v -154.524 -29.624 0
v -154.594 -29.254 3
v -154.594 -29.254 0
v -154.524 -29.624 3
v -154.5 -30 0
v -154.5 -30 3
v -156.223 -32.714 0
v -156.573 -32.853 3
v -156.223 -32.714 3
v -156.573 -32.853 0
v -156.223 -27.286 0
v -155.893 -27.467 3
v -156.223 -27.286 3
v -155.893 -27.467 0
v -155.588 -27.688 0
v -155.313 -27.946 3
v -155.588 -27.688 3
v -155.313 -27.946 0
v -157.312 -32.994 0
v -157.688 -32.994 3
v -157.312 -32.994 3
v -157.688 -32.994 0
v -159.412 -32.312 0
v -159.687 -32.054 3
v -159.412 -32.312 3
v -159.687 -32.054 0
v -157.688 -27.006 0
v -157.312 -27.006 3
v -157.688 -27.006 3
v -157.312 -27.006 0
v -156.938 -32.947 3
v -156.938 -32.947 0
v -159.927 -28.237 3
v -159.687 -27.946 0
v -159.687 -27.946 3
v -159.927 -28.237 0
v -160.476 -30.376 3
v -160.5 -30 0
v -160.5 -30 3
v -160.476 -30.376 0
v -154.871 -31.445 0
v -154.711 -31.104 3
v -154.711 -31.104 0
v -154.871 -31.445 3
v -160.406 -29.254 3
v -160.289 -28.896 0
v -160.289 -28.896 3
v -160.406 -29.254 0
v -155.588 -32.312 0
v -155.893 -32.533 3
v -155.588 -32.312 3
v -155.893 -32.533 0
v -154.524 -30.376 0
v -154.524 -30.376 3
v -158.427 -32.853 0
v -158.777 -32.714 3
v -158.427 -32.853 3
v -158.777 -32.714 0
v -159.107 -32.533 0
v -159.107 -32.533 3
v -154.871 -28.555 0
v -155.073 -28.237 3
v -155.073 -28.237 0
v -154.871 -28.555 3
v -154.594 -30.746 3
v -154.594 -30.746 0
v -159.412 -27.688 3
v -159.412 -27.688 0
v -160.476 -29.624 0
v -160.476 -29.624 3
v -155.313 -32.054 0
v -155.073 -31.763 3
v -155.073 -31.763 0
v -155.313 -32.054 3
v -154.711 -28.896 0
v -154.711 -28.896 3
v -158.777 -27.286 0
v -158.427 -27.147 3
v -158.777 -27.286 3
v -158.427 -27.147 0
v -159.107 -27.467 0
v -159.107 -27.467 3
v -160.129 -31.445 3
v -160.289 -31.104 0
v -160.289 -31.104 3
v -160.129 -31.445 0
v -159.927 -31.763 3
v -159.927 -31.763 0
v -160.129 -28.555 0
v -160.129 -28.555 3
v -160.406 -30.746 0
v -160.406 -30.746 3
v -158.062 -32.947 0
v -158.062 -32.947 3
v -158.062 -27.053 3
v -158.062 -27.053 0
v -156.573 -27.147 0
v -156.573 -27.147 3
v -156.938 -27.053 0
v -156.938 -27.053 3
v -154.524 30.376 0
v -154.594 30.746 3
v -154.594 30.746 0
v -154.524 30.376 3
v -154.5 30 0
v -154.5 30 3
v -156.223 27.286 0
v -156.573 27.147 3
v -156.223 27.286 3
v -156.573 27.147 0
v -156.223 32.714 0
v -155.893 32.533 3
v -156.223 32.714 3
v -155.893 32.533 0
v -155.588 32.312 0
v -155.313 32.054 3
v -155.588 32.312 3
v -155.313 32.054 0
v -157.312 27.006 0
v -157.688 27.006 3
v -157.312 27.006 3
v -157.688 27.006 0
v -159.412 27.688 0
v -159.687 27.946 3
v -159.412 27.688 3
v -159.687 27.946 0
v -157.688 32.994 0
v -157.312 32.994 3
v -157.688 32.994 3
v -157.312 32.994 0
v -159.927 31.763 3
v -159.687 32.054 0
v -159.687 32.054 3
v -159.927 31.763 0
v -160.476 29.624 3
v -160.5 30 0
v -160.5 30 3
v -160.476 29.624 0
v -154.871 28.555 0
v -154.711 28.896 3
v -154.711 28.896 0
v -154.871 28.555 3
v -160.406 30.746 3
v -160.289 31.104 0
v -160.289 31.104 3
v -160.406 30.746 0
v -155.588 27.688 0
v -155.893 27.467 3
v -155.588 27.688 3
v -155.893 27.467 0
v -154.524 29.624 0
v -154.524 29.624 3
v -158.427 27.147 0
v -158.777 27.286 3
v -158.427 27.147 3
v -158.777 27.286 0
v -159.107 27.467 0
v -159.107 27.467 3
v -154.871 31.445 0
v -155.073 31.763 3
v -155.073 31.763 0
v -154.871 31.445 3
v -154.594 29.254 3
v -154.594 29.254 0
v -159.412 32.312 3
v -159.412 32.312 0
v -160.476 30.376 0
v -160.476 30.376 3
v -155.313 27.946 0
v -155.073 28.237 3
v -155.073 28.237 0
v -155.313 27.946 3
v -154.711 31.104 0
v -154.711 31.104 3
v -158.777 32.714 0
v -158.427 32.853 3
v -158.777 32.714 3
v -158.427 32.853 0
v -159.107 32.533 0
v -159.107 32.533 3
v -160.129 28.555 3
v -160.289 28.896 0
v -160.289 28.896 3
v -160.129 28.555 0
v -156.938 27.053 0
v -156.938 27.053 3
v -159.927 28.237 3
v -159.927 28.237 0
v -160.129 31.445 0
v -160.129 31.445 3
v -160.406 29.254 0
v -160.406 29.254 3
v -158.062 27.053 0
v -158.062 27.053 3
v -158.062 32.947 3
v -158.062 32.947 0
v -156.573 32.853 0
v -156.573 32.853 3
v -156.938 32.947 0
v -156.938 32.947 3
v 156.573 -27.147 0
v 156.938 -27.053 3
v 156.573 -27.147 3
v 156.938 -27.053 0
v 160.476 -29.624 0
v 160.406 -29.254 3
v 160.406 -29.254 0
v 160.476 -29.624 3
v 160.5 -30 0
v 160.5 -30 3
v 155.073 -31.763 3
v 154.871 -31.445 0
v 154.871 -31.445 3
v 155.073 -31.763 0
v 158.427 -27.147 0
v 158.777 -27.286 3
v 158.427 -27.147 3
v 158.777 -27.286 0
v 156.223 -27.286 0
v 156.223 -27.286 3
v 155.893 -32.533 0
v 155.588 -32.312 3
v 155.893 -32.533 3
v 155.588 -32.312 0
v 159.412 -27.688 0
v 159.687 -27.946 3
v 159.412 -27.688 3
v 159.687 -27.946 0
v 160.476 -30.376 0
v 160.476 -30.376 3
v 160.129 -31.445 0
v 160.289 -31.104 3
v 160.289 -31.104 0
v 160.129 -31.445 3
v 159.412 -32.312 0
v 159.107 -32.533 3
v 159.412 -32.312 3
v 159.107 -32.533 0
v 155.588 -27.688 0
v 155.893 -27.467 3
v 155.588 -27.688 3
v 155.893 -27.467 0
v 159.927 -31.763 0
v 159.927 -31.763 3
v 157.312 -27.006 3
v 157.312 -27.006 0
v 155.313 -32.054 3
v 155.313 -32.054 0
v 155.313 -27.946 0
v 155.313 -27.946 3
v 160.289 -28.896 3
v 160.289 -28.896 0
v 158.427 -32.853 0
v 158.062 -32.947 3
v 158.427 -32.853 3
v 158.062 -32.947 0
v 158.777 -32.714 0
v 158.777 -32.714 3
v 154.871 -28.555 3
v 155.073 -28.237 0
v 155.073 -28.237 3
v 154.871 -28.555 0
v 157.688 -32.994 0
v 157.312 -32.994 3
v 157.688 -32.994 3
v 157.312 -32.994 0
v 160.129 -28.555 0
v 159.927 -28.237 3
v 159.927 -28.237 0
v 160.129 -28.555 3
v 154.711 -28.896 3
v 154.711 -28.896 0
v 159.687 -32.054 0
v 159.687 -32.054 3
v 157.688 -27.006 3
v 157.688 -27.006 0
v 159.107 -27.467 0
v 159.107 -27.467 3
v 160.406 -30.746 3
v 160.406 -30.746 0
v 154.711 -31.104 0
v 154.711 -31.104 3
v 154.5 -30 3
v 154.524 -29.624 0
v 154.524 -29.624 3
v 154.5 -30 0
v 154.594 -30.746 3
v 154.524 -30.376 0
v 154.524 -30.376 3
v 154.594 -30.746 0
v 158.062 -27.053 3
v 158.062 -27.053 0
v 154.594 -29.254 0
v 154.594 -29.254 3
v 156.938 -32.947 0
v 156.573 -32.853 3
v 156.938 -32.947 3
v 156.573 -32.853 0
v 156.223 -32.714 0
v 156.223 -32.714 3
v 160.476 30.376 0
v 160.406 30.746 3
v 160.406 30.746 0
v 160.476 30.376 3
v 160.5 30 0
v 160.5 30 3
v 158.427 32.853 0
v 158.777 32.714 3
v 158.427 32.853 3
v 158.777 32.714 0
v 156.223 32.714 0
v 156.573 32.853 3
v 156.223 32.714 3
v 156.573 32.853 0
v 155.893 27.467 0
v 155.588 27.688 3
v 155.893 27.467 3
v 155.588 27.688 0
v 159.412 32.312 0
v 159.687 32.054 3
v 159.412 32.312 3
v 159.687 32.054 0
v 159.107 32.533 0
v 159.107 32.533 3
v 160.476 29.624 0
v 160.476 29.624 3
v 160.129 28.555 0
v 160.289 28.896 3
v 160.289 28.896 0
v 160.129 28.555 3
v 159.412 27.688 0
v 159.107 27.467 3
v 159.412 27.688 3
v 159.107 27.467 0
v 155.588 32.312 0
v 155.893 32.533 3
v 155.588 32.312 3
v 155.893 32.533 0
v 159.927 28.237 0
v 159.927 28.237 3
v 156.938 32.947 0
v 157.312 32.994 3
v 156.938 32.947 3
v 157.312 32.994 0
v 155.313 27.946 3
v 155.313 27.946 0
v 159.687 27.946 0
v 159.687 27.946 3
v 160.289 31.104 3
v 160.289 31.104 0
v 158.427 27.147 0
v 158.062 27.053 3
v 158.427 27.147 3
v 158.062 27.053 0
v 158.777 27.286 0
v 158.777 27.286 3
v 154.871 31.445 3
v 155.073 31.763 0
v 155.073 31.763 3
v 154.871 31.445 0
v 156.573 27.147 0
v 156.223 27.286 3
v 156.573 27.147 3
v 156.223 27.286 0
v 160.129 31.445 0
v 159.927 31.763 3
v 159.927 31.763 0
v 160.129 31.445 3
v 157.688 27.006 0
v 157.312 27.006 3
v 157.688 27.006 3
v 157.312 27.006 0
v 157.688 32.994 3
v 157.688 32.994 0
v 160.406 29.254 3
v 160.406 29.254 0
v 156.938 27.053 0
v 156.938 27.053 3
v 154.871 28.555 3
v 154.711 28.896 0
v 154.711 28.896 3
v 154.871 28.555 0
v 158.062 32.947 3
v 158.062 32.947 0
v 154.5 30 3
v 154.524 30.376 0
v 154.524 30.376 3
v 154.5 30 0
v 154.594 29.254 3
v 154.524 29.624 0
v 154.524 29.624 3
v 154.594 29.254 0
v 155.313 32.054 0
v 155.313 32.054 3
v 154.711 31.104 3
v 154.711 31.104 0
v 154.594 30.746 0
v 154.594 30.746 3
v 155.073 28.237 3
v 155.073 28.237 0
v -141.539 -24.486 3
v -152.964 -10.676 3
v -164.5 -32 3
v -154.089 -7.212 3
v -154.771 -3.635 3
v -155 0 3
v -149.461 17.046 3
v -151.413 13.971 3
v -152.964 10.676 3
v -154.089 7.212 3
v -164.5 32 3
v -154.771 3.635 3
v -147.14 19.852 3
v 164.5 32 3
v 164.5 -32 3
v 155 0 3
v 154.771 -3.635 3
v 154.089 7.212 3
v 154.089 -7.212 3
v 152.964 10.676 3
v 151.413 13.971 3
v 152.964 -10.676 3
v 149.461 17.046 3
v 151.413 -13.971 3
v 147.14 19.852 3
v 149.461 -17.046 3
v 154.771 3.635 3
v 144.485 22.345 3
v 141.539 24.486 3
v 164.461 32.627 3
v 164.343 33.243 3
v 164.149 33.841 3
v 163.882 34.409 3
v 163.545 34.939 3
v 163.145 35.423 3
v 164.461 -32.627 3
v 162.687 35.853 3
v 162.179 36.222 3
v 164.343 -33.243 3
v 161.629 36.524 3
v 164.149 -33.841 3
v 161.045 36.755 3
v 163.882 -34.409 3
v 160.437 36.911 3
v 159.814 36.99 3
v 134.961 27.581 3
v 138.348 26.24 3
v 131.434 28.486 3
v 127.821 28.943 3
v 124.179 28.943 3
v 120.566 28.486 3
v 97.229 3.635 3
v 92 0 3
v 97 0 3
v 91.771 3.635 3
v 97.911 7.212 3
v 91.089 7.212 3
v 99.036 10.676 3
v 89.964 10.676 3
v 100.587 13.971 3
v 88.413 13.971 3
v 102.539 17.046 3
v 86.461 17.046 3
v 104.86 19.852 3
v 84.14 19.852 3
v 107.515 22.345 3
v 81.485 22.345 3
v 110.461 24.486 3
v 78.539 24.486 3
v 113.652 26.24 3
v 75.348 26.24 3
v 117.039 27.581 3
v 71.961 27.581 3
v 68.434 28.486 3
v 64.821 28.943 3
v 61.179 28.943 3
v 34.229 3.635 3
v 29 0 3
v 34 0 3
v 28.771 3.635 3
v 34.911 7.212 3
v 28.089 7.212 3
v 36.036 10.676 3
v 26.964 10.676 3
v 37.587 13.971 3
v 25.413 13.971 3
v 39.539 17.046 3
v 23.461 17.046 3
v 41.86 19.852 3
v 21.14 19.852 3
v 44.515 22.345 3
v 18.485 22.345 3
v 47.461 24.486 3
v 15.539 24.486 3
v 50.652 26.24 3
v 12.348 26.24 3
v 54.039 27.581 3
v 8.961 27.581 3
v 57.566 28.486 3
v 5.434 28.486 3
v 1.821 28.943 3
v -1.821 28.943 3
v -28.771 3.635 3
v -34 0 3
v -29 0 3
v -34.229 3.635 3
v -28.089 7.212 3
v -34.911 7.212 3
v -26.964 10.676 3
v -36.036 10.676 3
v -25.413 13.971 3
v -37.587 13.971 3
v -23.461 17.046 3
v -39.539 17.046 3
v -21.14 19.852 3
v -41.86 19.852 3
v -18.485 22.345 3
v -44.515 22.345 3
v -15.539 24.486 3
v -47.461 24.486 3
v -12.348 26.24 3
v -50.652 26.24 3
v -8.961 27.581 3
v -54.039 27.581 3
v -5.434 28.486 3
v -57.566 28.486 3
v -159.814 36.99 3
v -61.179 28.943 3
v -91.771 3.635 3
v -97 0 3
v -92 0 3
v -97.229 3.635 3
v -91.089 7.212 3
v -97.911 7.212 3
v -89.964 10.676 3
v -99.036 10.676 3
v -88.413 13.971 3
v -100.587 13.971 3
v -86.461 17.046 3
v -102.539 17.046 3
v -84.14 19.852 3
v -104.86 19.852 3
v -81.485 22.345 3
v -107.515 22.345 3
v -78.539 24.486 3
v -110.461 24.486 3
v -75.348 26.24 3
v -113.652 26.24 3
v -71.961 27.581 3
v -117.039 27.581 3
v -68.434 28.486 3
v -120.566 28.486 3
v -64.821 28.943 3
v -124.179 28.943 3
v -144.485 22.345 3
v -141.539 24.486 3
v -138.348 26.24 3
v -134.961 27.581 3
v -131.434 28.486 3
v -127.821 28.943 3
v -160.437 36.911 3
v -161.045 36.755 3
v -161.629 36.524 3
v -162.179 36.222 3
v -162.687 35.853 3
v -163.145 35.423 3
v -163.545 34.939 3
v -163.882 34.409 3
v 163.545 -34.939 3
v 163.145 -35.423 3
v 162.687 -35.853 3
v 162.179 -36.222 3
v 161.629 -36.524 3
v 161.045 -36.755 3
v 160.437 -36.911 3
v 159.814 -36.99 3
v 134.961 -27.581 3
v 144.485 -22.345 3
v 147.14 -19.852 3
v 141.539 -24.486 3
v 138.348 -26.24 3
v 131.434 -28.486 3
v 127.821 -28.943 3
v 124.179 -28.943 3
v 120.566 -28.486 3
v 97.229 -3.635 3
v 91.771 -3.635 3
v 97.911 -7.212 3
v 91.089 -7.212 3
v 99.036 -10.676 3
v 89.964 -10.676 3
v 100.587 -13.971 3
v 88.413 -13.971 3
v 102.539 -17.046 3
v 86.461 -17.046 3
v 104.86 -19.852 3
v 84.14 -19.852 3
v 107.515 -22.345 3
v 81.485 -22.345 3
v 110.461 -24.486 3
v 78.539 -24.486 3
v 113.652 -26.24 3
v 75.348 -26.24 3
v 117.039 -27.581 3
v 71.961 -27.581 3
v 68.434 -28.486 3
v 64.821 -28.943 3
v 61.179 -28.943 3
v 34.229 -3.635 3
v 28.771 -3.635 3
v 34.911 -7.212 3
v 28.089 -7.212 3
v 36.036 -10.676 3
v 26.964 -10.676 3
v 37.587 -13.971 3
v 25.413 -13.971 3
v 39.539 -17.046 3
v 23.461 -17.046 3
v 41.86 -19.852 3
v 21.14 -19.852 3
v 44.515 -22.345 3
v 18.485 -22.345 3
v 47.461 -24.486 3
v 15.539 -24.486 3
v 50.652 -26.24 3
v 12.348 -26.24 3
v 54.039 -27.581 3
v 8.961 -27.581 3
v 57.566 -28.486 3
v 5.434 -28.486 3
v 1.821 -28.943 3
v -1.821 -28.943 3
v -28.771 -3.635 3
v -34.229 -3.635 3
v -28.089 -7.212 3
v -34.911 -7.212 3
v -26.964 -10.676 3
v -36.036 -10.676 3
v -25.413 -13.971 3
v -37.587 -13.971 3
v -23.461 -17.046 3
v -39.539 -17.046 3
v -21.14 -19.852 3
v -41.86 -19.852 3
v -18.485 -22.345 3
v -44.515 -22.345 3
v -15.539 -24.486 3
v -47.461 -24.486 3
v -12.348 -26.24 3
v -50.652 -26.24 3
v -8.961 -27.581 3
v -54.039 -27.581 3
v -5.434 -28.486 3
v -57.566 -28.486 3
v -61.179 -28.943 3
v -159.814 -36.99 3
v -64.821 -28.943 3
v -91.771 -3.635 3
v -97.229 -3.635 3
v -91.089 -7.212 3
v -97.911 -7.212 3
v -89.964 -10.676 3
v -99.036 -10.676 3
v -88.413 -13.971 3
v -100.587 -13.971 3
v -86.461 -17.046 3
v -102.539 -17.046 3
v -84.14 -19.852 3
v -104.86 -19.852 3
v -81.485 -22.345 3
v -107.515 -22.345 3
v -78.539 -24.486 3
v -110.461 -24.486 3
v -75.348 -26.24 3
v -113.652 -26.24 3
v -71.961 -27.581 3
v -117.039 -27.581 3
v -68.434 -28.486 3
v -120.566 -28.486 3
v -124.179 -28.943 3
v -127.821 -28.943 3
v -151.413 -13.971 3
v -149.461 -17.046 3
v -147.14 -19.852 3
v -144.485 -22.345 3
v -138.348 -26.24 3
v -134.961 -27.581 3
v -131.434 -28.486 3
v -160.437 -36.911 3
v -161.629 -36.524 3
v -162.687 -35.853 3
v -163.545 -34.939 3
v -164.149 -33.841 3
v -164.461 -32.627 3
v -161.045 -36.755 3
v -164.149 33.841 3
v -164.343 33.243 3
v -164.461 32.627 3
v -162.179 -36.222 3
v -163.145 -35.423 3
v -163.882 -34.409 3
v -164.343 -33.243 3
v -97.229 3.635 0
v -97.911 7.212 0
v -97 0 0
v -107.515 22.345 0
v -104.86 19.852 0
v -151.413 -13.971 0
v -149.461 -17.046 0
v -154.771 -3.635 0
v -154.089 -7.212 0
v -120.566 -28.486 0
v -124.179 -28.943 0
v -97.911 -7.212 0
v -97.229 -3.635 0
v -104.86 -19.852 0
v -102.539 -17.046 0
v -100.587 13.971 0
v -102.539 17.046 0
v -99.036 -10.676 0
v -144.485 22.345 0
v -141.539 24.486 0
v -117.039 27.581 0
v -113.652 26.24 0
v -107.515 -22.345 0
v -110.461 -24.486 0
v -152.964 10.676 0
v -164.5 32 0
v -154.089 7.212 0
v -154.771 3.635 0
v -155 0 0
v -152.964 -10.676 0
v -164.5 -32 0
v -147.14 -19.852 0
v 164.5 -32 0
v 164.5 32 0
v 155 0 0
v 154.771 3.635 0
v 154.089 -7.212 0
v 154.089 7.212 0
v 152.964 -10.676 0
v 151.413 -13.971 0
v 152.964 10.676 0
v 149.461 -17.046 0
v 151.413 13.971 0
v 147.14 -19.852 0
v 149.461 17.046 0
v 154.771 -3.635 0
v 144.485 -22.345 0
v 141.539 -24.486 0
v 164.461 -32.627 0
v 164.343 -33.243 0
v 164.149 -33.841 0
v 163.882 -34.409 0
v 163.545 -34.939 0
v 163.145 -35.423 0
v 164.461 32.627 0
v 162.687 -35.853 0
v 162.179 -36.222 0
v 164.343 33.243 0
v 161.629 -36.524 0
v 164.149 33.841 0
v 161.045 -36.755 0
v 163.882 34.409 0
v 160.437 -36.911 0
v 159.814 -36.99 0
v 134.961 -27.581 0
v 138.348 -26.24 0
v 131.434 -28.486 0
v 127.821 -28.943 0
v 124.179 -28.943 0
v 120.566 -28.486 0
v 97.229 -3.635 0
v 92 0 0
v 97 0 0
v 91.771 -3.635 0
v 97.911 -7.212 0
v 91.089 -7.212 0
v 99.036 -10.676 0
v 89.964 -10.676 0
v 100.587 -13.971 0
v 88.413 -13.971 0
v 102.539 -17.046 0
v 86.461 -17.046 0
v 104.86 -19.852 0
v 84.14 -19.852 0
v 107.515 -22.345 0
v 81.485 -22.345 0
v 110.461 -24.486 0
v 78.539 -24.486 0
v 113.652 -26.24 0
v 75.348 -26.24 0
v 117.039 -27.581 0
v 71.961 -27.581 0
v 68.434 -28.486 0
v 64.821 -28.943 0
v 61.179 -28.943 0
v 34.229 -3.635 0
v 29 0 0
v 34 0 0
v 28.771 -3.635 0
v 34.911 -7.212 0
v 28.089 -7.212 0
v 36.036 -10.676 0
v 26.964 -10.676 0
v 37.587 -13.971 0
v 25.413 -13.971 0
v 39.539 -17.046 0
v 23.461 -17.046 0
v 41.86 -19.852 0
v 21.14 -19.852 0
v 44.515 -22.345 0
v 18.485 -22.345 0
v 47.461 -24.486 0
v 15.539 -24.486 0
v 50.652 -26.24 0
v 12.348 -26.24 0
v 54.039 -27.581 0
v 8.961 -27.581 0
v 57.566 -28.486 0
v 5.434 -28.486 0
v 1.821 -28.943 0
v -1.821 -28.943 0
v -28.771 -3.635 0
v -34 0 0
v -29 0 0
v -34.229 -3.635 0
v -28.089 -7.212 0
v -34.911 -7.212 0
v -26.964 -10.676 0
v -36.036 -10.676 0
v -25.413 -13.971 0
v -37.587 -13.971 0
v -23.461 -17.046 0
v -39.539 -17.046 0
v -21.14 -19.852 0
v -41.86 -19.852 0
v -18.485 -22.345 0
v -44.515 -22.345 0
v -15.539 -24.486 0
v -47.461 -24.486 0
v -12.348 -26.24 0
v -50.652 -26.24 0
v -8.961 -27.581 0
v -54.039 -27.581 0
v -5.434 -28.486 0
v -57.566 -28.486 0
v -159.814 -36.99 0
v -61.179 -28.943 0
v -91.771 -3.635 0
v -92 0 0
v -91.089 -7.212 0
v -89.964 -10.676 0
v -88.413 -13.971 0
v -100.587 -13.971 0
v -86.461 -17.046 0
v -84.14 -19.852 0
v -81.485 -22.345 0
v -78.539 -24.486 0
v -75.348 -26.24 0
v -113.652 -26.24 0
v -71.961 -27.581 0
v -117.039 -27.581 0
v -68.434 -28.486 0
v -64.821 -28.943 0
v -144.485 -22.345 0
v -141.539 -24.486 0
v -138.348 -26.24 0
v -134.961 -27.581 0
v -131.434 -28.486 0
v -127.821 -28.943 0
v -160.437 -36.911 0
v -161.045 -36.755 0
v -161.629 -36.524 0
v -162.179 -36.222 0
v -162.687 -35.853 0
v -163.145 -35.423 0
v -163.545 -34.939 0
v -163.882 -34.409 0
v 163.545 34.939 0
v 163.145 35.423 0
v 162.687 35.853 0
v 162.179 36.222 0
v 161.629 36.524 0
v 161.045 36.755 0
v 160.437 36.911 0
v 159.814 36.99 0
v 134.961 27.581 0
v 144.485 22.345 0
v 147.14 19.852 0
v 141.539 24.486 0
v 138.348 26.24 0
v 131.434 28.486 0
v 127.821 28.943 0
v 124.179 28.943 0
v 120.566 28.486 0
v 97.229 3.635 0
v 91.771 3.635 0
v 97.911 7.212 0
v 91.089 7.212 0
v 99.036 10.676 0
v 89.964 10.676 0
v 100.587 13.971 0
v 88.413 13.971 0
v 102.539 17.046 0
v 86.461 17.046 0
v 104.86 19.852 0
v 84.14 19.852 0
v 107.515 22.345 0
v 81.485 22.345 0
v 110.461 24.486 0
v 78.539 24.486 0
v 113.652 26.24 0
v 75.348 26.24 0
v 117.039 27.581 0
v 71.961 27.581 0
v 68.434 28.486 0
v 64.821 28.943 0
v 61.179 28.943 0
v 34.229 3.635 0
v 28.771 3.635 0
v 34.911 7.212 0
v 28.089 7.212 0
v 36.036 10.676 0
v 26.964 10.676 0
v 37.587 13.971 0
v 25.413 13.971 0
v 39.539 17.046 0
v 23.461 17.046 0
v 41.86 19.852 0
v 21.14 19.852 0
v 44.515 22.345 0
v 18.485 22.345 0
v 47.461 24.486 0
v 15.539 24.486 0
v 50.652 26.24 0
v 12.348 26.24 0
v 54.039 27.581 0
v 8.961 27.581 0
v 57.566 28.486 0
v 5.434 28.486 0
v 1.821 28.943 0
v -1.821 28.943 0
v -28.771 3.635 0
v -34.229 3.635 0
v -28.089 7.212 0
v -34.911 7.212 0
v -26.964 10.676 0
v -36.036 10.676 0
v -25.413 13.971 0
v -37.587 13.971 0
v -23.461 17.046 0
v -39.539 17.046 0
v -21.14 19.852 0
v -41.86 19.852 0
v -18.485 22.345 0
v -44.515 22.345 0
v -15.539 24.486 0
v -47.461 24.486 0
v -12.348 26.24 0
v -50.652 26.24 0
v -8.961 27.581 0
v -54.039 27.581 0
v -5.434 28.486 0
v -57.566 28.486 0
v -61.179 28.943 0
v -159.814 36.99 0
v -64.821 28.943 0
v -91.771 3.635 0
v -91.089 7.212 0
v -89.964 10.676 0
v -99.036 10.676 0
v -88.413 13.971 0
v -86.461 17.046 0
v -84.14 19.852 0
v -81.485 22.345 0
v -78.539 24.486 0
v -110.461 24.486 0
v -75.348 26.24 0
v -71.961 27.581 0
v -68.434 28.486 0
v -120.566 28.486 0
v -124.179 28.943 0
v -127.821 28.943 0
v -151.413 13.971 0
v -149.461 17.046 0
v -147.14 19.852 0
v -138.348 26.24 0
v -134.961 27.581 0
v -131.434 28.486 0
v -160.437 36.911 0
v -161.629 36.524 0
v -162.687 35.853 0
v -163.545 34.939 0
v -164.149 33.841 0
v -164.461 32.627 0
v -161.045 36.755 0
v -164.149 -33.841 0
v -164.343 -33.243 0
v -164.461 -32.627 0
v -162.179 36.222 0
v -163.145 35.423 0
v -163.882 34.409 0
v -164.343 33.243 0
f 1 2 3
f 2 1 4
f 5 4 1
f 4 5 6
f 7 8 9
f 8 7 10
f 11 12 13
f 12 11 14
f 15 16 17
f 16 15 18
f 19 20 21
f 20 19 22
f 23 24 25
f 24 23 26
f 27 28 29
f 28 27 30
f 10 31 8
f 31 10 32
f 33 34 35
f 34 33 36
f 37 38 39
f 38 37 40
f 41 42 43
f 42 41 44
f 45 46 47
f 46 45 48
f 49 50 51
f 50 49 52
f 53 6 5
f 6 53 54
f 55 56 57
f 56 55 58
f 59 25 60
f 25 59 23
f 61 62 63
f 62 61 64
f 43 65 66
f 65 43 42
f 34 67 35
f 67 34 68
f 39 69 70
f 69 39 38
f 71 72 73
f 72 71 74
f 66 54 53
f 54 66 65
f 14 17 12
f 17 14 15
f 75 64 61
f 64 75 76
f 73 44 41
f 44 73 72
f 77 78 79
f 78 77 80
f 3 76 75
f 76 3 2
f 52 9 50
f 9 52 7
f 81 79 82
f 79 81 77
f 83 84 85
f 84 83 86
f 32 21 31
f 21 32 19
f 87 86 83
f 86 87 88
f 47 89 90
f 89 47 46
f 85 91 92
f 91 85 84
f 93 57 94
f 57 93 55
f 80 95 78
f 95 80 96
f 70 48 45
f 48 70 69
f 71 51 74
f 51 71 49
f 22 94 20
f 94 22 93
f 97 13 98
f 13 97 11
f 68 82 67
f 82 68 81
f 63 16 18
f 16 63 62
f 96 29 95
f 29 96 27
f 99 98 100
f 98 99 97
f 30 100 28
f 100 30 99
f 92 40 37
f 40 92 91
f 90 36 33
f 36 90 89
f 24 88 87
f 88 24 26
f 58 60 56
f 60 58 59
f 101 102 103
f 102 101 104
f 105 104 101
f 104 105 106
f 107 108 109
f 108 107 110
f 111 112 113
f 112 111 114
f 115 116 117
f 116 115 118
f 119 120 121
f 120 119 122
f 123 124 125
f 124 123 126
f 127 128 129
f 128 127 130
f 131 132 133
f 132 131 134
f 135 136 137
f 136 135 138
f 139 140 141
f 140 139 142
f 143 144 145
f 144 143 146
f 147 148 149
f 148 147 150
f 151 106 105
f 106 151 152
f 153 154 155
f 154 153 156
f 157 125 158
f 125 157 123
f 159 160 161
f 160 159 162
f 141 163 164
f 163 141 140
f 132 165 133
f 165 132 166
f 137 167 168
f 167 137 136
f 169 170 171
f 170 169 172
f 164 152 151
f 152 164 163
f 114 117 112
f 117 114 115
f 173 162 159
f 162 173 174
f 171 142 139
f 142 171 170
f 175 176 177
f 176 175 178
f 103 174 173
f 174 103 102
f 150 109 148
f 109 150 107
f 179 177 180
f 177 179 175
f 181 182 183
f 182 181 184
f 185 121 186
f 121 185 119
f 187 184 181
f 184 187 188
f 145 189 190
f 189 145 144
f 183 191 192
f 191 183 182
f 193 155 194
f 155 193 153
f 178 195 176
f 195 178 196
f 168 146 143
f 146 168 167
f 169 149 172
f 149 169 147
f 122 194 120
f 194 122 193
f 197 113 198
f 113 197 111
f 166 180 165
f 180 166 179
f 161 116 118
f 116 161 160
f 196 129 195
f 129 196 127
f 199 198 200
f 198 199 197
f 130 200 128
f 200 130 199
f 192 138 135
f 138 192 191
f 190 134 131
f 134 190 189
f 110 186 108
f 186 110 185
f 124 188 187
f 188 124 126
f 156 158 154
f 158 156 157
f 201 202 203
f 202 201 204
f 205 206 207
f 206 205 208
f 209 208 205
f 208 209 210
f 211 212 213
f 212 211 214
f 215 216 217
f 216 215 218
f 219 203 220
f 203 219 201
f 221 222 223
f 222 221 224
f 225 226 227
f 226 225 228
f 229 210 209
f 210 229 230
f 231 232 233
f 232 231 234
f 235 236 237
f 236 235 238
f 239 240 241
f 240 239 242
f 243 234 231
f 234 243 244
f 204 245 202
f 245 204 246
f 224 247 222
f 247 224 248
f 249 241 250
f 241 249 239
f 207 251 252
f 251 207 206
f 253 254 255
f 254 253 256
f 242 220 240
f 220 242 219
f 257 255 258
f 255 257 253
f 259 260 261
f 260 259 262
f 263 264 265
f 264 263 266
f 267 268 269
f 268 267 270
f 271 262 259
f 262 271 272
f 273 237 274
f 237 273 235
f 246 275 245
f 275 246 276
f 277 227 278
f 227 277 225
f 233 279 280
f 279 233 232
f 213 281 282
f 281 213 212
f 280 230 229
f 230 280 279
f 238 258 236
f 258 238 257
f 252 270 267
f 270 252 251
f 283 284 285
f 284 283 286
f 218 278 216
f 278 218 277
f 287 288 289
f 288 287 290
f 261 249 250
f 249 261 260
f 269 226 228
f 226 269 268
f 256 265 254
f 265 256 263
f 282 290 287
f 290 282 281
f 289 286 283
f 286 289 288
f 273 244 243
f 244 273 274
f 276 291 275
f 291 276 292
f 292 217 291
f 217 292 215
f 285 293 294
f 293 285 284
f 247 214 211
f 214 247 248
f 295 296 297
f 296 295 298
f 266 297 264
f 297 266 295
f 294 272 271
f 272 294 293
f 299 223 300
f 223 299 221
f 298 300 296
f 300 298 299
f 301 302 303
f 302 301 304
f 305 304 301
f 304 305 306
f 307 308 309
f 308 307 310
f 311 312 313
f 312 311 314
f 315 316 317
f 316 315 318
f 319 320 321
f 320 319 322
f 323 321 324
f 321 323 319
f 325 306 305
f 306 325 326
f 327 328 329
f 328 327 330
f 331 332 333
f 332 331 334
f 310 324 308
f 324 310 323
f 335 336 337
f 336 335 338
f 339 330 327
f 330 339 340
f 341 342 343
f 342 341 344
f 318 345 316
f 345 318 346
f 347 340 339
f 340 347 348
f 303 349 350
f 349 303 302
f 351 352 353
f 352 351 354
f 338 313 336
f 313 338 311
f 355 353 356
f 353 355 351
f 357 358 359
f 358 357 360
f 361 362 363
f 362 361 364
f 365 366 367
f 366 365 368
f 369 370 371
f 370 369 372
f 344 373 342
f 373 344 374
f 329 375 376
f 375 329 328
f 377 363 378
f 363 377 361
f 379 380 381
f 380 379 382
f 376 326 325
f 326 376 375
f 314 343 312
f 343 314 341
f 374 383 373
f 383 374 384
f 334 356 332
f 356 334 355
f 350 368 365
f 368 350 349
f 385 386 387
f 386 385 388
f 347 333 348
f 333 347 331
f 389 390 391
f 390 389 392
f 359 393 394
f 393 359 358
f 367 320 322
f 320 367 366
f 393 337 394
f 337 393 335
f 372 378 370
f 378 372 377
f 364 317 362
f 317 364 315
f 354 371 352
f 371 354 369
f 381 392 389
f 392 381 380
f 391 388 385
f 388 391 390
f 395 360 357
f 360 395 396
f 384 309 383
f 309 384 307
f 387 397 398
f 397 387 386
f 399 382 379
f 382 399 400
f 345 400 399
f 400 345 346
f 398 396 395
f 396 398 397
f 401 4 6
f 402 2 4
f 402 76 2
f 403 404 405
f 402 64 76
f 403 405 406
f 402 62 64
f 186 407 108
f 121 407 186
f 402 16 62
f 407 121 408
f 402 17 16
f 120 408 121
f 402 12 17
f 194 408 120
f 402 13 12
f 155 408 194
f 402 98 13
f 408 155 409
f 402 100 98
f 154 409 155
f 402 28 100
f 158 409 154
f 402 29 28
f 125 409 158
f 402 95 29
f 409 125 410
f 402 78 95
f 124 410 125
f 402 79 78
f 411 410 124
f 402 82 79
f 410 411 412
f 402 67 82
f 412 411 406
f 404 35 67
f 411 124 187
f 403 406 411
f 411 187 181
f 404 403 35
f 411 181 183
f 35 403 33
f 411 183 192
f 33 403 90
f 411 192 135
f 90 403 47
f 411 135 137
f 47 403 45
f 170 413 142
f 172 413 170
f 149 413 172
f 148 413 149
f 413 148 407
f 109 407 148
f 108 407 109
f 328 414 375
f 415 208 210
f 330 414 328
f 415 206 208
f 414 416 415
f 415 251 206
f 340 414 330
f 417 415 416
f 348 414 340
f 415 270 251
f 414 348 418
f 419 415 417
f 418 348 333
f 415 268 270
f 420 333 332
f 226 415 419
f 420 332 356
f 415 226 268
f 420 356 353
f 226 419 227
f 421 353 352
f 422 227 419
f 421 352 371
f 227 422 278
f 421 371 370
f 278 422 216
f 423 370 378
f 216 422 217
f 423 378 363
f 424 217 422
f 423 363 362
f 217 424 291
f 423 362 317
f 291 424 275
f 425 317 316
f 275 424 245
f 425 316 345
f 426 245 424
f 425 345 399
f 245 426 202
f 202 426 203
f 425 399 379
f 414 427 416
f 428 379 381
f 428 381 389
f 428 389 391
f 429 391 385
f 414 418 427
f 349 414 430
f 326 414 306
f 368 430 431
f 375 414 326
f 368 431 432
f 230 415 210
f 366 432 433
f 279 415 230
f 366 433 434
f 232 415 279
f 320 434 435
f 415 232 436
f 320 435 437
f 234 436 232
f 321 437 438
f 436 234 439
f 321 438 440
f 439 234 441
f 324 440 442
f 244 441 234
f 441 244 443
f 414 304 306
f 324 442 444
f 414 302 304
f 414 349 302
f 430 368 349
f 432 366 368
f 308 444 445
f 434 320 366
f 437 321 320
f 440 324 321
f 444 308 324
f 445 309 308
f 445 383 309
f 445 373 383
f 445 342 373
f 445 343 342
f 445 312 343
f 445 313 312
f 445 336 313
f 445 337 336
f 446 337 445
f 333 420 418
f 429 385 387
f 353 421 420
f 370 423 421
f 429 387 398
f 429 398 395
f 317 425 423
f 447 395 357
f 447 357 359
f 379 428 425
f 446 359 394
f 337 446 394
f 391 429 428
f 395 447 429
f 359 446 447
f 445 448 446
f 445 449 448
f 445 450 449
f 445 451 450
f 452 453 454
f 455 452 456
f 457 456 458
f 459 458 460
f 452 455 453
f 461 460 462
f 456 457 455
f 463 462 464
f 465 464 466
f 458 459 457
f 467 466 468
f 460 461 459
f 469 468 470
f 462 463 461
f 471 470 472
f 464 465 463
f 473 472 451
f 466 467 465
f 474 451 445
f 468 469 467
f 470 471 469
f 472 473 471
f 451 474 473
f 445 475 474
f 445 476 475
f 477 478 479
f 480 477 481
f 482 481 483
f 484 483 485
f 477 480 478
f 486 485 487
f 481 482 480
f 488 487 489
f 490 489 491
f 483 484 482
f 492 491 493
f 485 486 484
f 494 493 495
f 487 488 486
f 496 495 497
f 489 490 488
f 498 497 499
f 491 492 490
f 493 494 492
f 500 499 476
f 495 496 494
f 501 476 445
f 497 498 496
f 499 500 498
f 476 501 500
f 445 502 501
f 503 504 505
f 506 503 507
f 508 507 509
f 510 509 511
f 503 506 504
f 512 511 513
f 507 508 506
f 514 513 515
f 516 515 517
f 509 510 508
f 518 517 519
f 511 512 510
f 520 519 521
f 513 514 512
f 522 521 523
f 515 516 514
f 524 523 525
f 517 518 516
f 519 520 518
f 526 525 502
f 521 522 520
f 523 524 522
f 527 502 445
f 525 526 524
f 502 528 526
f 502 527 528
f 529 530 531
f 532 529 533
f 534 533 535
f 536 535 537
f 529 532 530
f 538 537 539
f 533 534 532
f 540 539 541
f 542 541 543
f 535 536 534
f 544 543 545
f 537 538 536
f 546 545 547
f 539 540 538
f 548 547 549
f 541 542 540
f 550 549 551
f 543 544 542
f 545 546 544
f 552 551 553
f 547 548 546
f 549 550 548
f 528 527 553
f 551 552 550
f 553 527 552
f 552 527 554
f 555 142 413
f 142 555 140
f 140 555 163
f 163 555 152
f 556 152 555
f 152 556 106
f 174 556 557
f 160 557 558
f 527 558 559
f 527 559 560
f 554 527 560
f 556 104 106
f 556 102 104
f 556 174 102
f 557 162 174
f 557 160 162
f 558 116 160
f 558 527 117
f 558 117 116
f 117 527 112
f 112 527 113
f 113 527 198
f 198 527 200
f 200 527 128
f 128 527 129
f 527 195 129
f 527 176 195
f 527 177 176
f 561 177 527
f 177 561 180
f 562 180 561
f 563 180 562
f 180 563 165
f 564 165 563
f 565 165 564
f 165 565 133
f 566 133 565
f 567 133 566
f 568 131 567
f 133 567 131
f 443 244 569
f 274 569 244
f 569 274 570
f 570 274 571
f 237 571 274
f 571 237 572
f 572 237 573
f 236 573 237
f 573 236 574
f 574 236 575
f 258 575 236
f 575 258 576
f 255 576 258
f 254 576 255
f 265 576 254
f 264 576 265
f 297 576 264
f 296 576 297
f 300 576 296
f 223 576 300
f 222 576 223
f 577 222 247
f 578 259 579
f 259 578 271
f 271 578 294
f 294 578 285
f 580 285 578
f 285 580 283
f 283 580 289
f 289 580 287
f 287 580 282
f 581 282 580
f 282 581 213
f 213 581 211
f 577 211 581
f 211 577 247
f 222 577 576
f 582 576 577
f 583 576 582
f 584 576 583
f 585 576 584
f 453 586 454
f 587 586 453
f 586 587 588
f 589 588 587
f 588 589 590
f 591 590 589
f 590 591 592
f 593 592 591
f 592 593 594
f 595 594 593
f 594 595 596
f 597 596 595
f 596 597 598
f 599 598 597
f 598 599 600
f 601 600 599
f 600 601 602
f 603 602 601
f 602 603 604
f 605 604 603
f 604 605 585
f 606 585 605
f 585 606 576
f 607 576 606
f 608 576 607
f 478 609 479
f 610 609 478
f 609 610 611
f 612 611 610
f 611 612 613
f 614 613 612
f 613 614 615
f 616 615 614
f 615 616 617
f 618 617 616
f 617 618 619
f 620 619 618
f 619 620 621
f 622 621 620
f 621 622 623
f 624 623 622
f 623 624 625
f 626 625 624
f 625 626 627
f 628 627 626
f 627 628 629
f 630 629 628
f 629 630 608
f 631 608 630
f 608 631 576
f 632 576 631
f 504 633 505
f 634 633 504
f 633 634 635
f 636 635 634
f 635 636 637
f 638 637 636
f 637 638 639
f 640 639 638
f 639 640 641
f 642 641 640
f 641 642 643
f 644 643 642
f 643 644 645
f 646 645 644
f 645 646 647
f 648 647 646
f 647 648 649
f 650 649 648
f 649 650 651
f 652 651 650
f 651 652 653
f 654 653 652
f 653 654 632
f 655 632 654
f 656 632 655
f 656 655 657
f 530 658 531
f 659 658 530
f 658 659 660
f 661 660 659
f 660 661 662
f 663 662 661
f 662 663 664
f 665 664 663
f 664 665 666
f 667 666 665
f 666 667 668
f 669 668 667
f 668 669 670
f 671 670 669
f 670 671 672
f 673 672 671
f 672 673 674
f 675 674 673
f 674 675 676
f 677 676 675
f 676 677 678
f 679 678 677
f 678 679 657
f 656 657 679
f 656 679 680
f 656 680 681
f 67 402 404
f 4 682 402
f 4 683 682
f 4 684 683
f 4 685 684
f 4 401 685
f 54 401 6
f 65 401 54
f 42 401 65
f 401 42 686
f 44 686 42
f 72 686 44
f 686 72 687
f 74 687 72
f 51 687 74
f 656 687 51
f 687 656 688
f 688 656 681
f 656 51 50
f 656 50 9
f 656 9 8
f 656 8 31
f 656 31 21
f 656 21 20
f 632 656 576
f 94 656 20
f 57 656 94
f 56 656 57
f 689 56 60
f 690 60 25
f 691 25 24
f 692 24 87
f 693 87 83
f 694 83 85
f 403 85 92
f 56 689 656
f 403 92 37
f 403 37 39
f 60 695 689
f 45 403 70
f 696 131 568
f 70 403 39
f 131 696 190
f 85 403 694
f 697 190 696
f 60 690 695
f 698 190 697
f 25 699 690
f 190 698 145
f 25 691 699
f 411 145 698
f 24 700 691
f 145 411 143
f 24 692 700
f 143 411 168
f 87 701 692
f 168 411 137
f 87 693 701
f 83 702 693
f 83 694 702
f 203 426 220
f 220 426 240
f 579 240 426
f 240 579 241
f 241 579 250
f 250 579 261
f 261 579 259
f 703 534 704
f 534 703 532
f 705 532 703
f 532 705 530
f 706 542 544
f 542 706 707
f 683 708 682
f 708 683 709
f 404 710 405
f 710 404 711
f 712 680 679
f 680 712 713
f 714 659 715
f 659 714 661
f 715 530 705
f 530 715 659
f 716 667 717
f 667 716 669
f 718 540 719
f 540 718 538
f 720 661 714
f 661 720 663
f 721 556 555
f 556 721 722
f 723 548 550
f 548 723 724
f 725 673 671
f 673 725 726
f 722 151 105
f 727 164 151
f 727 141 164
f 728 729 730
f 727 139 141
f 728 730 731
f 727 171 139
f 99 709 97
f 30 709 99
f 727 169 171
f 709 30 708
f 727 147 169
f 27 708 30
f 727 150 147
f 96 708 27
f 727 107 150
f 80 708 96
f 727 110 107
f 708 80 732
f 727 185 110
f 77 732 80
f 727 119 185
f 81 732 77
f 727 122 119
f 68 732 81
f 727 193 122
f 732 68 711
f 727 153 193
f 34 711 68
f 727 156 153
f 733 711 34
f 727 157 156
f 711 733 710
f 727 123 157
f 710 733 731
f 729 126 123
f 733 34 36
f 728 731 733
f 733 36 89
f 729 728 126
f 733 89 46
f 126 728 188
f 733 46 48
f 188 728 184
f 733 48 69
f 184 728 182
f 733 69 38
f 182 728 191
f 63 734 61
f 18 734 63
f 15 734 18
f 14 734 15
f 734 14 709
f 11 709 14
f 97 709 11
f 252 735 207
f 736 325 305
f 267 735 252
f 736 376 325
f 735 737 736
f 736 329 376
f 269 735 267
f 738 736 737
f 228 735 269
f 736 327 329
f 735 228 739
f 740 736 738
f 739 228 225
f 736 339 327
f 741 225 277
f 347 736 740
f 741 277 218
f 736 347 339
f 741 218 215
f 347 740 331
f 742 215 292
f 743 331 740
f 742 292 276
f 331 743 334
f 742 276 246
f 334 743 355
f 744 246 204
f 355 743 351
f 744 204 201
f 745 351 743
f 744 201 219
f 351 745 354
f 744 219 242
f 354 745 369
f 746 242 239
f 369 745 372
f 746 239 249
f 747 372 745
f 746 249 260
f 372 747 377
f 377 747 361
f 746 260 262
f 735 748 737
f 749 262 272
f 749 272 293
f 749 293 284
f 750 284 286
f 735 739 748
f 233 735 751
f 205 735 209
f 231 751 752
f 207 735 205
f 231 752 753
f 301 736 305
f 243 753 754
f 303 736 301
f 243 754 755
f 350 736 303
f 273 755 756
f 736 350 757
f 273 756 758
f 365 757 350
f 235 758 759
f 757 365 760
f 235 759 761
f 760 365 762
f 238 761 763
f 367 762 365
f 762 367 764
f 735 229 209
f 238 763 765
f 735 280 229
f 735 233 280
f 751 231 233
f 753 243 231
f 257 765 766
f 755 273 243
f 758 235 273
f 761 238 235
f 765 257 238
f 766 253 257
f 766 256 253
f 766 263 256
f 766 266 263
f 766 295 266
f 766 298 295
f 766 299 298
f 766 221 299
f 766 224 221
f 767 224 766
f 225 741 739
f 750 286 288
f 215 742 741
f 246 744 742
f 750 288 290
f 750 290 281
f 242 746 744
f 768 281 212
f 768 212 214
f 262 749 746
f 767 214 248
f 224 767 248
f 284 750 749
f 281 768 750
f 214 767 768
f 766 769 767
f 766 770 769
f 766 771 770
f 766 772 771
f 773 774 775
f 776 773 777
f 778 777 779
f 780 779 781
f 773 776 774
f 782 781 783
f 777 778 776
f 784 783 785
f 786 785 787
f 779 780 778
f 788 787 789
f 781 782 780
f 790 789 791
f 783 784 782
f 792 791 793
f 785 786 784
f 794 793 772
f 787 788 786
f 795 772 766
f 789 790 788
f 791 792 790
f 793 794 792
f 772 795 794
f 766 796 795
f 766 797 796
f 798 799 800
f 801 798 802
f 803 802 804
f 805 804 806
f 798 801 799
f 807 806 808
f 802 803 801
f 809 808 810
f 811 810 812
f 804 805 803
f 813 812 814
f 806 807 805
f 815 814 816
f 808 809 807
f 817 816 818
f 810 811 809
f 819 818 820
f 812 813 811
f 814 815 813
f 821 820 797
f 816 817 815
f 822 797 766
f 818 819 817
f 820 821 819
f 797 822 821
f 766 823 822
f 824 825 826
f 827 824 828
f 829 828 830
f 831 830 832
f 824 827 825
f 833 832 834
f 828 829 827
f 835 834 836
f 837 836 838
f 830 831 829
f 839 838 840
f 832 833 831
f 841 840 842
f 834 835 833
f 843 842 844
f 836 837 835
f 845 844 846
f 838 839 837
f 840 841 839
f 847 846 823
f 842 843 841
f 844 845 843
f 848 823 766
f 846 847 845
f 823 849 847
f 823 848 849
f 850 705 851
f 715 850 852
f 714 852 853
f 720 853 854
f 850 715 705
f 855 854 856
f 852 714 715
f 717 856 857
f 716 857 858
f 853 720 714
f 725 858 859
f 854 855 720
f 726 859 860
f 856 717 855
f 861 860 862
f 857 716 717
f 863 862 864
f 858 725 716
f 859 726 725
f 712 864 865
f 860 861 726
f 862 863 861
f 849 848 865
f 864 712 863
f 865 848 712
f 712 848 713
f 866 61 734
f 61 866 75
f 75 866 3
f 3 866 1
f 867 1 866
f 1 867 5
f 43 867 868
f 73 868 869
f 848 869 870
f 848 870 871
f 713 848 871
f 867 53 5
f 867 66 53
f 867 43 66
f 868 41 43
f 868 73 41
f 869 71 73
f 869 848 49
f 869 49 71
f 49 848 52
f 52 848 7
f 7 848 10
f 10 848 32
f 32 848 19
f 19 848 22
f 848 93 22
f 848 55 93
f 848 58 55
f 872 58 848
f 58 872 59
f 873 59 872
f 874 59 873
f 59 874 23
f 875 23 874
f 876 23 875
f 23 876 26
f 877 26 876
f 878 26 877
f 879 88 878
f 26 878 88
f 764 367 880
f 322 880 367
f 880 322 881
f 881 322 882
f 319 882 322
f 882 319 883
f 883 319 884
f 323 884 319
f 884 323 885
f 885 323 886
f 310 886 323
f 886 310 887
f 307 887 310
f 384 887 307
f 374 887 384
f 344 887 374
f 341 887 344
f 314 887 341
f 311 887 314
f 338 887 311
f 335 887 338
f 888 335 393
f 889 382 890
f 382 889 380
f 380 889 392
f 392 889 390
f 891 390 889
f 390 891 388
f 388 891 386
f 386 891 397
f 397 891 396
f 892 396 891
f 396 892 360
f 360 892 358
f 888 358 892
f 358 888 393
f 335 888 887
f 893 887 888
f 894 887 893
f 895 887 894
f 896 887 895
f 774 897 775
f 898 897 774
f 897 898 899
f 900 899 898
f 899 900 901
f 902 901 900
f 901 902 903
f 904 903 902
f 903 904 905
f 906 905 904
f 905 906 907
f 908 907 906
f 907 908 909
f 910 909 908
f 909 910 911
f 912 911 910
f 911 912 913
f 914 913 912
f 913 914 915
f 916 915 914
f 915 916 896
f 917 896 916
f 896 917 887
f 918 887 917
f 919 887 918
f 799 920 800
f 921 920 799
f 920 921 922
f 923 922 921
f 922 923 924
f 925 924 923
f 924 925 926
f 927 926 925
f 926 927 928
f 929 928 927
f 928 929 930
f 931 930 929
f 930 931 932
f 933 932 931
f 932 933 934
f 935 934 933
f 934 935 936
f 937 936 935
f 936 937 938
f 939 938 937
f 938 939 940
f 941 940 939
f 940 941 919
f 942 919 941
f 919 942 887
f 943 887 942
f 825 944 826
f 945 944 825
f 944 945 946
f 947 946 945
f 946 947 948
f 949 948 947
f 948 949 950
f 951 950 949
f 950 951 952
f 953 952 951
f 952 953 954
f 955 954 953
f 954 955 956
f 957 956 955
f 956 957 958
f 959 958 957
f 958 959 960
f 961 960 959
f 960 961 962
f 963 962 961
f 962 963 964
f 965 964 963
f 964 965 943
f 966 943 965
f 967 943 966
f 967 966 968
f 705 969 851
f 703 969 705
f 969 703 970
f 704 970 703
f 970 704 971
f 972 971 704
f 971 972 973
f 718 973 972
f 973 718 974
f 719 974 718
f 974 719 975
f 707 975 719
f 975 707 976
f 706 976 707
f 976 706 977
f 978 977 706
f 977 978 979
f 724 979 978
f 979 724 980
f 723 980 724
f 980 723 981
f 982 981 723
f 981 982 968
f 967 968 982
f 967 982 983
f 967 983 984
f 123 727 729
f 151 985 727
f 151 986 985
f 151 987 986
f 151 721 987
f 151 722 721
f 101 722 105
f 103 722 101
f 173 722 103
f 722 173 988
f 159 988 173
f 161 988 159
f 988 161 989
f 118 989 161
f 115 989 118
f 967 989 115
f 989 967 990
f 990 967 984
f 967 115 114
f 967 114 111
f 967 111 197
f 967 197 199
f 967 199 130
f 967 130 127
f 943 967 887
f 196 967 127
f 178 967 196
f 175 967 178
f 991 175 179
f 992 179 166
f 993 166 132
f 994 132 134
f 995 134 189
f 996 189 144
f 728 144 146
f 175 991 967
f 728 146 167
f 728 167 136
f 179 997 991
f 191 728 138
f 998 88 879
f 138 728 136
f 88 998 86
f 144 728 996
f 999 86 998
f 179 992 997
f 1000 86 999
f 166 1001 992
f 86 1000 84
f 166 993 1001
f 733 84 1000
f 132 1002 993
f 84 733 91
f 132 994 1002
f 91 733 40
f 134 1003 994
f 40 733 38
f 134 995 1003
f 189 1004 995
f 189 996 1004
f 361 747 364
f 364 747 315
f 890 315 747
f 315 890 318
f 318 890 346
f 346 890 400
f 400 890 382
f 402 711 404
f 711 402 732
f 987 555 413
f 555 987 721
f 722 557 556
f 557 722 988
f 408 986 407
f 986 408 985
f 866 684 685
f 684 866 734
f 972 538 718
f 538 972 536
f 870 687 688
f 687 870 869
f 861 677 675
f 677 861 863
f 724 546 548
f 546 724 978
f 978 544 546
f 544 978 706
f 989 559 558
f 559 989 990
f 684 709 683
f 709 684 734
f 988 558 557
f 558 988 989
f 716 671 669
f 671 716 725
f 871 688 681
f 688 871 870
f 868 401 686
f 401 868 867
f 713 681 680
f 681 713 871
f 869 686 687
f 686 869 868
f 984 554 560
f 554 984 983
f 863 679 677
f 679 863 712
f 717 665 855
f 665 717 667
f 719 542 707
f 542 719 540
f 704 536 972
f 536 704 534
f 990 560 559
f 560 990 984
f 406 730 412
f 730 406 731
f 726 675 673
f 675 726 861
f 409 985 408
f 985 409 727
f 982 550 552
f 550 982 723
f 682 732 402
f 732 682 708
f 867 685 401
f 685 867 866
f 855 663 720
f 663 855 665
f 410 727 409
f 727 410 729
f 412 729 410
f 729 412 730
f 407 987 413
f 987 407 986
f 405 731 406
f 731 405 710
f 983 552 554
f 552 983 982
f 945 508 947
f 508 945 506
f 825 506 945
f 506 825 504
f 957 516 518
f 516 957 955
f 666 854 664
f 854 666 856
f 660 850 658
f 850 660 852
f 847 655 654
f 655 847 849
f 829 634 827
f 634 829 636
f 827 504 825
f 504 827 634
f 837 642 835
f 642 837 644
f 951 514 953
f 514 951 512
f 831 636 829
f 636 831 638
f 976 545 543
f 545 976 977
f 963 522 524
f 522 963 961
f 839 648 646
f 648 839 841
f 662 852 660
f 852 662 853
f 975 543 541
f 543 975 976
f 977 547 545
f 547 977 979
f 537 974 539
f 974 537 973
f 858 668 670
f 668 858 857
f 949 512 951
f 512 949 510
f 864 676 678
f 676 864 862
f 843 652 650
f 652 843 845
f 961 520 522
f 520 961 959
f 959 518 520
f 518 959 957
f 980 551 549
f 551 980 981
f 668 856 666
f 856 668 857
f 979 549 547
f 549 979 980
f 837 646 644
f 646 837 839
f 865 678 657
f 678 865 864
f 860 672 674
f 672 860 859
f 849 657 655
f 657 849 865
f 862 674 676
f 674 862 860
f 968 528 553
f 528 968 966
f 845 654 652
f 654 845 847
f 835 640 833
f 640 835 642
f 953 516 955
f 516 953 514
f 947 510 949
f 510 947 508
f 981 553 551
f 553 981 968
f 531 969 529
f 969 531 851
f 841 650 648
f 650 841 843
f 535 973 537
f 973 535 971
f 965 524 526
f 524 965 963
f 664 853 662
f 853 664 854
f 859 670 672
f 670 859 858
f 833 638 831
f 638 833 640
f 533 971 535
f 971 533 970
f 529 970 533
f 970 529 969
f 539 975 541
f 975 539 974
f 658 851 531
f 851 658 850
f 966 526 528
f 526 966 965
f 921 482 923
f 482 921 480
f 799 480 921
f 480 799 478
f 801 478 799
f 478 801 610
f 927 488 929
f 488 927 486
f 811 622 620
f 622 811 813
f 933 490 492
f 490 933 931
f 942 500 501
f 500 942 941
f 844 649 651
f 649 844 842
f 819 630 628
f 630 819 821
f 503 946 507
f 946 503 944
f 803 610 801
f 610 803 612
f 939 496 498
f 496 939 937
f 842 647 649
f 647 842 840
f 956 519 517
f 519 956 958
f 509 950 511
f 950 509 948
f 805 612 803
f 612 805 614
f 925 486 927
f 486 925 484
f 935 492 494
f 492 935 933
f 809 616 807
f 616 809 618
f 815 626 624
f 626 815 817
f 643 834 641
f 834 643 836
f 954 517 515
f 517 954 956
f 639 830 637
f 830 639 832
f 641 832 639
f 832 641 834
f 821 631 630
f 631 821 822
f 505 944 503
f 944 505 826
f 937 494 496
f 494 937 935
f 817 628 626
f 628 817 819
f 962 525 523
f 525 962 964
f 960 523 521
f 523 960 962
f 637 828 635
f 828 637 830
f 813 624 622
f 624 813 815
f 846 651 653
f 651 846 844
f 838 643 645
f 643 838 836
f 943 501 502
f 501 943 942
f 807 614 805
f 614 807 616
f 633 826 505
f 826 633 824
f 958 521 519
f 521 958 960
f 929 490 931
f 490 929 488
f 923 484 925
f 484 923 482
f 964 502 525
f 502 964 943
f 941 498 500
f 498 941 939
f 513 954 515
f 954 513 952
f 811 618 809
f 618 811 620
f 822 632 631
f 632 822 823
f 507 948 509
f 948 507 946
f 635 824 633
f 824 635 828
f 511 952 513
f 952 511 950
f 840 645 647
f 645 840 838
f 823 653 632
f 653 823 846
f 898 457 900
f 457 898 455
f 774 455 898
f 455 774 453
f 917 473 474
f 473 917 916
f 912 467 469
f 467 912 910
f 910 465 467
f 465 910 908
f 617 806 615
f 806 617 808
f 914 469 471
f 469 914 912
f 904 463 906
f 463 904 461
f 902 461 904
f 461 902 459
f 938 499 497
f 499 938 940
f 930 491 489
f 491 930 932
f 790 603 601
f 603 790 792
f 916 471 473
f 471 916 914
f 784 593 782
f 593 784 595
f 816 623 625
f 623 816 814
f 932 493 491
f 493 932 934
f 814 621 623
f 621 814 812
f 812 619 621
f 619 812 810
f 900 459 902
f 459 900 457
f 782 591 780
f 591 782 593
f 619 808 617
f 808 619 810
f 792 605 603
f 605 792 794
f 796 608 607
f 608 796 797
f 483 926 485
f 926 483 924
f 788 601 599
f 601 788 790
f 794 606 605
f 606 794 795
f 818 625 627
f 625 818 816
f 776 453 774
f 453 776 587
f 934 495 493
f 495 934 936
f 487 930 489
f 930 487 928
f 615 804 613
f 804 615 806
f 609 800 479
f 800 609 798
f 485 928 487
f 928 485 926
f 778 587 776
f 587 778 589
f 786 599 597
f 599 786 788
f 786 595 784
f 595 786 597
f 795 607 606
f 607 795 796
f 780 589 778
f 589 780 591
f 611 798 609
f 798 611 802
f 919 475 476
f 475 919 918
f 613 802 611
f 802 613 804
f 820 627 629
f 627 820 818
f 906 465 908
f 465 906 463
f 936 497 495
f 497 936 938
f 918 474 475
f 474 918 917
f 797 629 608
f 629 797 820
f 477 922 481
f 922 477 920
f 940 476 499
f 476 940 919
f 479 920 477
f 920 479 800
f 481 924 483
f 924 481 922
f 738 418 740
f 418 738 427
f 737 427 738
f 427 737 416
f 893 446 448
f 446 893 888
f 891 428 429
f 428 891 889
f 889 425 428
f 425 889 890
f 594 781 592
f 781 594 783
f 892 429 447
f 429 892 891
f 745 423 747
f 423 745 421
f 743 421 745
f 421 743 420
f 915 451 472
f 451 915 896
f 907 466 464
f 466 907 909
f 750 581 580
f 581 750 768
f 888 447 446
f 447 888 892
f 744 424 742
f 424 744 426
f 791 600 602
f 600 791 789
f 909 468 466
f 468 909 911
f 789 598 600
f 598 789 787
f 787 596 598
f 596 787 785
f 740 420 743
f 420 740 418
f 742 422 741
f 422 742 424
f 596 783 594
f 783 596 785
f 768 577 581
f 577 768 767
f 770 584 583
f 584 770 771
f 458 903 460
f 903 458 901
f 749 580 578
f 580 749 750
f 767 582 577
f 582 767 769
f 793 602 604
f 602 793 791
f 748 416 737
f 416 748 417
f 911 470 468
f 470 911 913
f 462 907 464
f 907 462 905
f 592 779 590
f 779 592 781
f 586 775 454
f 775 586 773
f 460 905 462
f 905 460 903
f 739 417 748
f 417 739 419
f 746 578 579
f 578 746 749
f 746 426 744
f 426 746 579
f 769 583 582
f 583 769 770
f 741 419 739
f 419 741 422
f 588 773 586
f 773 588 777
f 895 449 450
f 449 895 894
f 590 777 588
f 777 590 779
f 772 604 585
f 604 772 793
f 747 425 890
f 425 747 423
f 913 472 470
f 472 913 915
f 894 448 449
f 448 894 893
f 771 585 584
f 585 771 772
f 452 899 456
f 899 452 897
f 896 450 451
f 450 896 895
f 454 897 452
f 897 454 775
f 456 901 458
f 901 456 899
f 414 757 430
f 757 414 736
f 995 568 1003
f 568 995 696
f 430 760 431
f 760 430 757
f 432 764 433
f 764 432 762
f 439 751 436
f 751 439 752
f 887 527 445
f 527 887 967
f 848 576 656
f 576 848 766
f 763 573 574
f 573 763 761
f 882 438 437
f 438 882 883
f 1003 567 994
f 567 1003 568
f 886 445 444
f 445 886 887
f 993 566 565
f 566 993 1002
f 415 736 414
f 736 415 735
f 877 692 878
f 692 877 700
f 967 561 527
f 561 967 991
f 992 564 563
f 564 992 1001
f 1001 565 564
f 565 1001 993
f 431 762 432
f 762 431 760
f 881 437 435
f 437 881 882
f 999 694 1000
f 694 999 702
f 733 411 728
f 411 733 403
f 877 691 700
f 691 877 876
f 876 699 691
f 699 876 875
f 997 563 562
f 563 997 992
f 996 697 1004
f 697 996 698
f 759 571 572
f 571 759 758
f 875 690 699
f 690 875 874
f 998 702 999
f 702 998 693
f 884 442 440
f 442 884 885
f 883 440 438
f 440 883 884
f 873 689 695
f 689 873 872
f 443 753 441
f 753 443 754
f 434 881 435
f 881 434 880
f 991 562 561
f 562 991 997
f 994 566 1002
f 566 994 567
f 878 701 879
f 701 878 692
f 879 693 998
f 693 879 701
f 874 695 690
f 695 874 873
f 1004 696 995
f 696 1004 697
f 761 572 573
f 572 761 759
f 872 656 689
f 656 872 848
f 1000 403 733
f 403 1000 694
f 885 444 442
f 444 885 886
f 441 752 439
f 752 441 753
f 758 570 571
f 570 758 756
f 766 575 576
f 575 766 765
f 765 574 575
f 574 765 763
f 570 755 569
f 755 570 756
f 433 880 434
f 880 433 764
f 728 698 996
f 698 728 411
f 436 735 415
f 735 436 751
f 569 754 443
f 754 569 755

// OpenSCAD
$fn = 50;


difference() {
	union() {
		hull() {
			translate(v = [-159.5000000000, 32.0000000000, 0]) {
				cylinder(h = 3, r = 5);
			}
			translate(v = [159.5000000000, 32.0000000000, 0]) {
				cylinder(h = 3, r = 5);
			}
			translate(v = [-159.5000000000, -32.0000000000, 0]) {
				cylinder(h = 3, r = 5);
			}
			translate(v = [159.5000000000, -32.0000000000, 0]) {
				cylinder(h = 3, r = 5);
			}
		}
	}
	union() {
		#translate(v = [-157.5000000000, -30.0000000000, -100.0000000000]) {
			cylinder(h = 200, r = 3.0000000000);
		}
		#translate(v = [-157.5000000000, 30.0000000000, -100.0000000000]) {
			cylinder(h = 200, r = 3.0000000000);
		}
		#translate(v = [157.5000000000, -30.0000000000, -100.0000000000]) {
			cylinder(h = 200, r = 3.0000000000);
		}
		#translate(v = [157.5000000000, 30.0000000000, -100.0000000000]) {
			cylinder(h = 200, r = 3.0000000000);
		}
		#translate(v = [-126.0000000000, 0, 0]) {
			cylinder(h = 3, r = 29.0000000000);
		}
		#translate(v = [-63.0000000000, 0, 0]) {
			cylinder(h = 3, r = 29.0000000000);
		}
		#cylinder(h = 3, r = 29.0000000000);
		#translate(v = [63.0000000000, 0, 0]) {
			cylinder(h = 3, r = 29.0000000000);
		}
		#translate(v = [126.0000000000, 0, 0]) {
			cylinder(h = 3, r = 29.0000000000);
		}
	}
}
